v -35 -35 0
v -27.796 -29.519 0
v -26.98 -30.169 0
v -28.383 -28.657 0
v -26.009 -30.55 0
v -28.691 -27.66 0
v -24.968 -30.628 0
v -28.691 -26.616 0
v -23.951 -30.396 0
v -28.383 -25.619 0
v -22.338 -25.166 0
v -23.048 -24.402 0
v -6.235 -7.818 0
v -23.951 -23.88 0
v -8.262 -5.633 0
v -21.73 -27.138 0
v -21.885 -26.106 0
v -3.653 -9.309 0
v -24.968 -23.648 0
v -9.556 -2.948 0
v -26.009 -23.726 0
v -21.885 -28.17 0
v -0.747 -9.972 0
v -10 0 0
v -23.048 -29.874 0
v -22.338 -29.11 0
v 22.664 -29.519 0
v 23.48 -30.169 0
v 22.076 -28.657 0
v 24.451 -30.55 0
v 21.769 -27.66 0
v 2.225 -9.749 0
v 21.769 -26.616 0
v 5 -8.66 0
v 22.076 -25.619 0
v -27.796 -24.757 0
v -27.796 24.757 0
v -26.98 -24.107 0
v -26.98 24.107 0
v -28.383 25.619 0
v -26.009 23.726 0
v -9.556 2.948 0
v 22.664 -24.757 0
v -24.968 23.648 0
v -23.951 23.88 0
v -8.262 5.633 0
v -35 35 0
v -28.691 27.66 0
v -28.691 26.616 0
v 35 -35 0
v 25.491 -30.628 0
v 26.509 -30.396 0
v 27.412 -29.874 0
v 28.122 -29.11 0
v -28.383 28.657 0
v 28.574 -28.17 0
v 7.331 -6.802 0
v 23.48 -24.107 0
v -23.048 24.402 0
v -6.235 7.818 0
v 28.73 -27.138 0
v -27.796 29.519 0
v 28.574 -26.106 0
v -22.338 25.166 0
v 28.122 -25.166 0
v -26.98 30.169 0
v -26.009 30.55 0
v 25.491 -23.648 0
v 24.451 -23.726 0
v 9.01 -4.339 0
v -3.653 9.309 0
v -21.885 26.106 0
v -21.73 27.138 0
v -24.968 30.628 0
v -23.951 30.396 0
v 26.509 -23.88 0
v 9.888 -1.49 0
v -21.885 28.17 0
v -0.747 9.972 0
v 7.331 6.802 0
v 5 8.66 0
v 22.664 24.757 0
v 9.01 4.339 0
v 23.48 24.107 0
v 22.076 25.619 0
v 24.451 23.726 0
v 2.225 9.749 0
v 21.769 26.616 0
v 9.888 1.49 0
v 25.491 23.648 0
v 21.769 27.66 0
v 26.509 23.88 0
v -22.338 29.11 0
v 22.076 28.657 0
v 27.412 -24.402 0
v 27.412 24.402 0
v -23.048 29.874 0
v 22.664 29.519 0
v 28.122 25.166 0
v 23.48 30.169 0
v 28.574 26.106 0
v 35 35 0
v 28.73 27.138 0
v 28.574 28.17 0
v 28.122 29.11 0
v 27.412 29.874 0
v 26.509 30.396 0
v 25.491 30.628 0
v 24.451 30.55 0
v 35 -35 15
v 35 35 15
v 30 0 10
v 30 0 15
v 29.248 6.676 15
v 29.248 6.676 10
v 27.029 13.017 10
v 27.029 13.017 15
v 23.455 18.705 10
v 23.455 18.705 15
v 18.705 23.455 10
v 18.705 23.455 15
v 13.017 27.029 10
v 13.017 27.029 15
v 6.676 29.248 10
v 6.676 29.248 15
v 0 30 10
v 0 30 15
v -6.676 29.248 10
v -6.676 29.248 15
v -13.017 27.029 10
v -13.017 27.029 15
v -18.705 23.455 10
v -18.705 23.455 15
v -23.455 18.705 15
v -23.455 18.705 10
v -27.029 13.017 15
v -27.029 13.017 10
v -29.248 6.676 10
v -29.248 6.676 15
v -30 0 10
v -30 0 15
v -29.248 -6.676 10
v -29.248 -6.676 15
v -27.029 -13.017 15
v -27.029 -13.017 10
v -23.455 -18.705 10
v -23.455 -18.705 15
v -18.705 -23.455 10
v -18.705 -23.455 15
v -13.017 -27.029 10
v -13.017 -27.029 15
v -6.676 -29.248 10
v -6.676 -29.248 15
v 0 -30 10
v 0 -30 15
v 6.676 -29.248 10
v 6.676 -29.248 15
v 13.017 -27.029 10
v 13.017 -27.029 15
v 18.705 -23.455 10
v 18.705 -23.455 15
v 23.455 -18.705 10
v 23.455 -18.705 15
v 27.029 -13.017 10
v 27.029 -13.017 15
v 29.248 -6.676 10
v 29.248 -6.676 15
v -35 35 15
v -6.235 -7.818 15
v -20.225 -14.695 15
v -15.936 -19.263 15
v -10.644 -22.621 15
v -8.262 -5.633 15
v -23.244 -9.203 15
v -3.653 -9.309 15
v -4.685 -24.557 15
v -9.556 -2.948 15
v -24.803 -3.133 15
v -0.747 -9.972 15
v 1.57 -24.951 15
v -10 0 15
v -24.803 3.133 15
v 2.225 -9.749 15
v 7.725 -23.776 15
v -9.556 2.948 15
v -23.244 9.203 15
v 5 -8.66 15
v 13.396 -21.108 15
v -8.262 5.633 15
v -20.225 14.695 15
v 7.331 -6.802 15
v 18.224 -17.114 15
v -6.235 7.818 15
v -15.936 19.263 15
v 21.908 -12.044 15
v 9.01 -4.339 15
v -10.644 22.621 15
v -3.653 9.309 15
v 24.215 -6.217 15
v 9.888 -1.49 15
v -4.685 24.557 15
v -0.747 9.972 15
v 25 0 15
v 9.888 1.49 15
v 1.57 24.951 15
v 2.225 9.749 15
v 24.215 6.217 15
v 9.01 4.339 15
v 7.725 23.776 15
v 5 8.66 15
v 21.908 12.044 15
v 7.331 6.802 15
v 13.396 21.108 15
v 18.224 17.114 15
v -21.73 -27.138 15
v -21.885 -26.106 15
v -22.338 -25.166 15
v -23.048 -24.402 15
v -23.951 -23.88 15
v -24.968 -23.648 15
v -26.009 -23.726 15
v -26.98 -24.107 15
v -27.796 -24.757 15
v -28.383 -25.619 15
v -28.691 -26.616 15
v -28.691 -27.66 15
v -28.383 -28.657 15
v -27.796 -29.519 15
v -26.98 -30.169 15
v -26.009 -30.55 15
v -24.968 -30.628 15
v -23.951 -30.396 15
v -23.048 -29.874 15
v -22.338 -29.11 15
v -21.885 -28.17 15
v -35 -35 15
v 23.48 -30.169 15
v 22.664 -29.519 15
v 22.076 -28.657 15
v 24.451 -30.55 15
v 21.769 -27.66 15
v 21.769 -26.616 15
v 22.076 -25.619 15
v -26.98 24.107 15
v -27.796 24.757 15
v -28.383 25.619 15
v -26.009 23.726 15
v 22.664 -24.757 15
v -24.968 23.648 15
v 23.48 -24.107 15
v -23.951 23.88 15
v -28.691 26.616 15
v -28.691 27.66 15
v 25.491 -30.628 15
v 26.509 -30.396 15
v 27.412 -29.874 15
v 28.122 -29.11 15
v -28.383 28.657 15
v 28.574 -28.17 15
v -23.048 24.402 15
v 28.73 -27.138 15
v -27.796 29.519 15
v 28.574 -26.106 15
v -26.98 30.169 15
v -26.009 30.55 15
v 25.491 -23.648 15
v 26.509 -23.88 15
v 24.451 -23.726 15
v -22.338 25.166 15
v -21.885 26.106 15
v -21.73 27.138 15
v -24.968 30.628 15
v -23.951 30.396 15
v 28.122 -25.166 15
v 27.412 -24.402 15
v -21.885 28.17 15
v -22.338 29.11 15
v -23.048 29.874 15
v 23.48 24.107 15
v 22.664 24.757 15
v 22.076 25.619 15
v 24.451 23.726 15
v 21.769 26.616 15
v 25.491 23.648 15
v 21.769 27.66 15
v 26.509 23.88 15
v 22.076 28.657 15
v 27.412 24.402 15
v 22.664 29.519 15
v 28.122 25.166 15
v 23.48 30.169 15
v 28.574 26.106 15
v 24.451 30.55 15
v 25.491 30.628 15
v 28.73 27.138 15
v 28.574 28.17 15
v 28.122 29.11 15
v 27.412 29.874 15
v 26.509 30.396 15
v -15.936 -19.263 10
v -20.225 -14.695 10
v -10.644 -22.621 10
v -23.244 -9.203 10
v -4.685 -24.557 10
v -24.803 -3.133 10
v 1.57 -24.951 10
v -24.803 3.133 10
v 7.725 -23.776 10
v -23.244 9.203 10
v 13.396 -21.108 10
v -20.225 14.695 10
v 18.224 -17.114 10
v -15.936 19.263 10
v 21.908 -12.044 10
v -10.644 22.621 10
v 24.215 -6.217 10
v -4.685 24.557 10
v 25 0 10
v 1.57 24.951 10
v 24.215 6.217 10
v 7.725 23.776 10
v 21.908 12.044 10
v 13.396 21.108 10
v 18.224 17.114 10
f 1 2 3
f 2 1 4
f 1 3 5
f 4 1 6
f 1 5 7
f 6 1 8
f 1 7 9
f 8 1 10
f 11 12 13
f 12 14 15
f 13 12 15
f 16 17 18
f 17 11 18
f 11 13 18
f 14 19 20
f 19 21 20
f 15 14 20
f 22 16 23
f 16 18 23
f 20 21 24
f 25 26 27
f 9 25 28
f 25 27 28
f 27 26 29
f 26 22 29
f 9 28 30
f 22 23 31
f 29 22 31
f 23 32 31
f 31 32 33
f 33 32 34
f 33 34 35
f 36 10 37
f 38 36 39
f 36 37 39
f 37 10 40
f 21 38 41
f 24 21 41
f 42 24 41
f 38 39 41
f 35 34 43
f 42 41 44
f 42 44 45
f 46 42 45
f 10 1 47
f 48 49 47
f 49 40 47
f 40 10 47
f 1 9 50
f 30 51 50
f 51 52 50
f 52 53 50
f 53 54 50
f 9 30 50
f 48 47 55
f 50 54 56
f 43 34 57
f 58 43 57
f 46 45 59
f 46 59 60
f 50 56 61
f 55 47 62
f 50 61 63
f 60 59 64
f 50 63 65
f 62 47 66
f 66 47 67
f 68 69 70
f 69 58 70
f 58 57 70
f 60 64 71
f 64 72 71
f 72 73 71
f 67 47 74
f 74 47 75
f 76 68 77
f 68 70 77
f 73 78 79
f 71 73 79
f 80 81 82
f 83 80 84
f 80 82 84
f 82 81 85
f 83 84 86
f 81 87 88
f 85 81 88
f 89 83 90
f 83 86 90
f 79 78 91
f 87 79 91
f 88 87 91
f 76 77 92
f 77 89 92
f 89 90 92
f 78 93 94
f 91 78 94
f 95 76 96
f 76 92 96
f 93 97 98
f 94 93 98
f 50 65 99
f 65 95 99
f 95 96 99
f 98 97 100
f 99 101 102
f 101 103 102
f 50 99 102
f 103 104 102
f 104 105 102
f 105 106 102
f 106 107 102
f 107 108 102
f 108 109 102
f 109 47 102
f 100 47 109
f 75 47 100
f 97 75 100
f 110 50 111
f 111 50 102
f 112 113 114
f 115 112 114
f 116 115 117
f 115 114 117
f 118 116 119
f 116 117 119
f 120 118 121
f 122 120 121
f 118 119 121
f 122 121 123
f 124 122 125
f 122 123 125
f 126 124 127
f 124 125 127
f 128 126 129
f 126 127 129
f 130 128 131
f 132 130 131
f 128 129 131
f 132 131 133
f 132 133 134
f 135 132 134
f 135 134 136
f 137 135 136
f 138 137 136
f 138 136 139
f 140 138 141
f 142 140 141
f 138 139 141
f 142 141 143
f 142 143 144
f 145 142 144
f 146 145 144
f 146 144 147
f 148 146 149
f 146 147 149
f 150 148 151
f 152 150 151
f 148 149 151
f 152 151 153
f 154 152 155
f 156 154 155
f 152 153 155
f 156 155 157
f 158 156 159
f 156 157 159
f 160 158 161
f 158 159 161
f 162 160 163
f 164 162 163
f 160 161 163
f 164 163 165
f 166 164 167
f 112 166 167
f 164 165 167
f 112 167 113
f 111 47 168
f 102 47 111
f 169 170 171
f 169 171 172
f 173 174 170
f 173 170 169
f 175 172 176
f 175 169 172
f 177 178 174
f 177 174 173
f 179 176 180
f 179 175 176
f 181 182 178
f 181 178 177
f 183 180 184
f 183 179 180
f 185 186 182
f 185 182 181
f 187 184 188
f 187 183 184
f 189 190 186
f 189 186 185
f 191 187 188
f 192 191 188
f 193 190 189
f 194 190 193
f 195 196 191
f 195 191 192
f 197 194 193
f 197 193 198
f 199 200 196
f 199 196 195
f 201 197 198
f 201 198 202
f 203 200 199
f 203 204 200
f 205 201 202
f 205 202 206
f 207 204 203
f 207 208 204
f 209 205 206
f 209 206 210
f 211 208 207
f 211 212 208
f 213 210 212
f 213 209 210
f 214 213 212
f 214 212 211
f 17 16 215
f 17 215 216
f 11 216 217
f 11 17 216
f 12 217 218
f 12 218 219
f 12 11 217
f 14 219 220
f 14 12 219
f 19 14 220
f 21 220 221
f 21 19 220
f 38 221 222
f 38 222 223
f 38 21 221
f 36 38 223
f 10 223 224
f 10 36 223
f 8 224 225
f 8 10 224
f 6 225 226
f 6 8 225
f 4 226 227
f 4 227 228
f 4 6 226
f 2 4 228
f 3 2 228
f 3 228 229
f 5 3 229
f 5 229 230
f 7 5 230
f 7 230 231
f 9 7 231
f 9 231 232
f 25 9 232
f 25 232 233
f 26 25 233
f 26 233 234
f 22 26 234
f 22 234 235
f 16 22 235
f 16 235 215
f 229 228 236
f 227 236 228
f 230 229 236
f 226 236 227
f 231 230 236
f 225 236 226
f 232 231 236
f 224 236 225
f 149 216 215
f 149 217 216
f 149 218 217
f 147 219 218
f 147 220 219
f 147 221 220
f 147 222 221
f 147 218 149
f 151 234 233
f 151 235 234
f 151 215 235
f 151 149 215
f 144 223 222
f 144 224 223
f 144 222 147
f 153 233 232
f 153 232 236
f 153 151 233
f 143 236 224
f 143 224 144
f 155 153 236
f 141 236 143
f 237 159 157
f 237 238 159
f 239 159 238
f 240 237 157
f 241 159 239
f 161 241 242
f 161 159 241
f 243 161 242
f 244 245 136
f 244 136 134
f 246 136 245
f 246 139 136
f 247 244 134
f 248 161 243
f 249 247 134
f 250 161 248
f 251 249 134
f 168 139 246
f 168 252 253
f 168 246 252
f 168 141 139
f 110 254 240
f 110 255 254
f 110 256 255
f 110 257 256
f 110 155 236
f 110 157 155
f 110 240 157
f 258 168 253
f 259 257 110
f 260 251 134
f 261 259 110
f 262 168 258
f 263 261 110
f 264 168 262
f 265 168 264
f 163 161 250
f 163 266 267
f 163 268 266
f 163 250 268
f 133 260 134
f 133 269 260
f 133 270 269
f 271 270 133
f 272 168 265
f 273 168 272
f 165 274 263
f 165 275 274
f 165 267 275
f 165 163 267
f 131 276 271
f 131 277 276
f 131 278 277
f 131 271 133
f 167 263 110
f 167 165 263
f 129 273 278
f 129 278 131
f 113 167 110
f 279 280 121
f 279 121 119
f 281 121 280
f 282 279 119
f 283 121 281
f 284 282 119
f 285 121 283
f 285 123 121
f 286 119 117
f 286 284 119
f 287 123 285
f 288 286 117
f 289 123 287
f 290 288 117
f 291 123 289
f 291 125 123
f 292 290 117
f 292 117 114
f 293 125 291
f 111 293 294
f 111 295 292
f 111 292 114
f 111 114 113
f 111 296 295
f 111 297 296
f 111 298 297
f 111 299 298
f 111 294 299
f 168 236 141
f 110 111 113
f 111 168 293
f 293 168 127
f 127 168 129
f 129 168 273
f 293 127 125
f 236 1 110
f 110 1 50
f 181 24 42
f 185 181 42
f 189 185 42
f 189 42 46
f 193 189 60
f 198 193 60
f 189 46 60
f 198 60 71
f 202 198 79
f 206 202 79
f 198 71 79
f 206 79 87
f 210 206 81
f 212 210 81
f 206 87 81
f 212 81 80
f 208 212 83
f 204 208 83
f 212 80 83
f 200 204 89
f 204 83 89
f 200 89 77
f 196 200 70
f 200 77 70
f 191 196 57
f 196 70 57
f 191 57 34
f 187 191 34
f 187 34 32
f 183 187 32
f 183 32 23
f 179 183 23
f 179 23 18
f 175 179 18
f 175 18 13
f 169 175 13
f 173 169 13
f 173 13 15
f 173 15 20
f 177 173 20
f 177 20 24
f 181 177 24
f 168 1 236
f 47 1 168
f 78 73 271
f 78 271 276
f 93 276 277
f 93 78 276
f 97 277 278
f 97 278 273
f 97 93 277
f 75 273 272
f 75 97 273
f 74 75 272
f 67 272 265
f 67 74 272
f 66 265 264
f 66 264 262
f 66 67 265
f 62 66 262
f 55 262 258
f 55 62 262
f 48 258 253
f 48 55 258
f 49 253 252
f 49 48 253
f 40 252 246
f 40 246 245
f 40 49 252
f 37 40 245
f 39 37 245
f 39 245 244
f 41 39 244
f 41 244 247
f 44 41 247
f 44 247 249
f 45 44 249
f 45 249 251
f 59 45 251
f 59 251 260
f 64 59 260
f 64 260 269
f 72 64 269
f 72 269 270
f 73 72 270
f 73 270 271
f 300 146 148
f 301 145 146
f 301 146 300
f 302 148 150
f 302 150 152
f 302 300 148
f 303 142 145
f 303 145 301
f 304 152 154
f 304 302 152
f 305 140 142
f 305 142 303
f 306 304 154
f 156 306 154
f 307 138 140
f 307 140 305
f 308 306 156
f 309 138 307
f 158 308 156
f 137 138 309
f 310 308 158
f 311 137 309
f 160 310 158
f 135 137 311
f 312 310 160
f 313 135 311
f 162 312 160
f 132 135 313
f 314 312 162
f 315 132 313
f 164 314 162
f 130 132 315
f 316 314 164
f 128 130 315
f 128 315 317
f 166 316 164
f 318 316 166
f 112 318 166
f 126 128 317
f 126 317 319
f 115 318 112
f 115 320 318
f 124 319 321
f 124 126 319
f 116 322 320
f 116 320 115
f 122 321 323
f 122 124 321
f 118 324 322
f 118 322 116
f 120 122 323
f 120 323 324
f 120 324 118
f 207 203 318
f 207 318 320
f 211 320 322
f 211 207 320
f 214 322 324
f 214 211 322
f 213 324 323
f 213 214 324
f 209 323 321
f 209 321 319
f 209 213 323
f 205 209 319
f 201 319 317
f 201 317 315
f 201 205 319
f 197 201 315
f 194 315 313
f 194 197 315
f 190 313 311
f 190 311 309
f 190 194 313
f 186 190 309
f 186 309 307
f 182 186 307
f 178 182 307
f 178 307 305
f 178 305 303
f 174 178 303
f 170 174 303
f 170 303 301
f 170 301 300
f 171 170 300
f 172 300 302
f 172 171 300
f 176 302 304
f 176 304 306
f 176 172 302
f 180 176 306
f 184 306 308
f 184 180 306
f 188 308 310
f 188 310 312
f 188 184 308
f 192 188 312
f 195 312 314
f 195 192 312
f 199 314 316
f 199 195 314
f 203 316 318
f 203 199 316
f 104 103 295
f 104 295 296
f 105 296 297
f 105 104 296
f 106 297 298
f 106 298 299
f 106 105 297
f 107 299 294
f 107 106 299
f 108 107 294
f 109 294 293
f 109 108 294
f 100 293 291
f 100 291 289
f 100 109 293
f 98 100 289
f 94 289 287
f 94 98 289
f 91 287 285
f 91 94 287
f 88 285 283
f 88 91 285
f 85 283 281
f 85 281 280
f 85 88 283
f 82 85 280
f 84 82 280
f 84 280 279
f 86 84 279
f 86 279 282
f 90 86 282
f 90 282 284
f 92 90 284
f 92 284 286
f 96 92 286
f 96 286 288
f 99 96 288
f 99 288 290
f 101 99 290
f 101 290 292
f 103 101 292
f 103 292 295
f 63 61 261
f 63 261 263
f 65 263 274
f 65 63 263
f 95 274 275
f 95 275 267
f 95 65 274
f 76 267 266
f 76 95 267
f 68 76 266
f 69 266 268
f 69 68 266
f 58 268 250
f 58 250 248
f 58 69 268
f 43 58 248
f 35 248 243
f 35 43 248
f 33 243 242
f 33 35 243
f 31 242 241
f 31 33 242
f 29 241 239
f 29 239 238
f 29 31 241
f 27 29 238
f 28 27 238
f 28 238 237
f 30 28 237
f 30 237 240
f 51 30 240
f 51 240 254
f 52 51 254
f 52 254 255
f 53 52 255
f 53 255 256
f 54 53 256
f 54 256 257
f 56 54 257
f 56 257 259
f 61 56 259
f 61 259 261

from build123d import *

# Parameters (mm, degrees)
SKETCH1_W           = 70
SKETCH1_H           = 70
BOSS_EXTRUDE1_DEPTH = 15
SKETCH2_R           = 30
SKETCH2_R_2         = 25
SKETCH2_R_3         = 3.5
CUT_EXTRUDE1_DEPTH  = 5
SKETCH3_R           = 3.5
CUT_EXTRUDE2_DEPTH  = 16
SKETCH4_R           = 10
CUT_EXTRUDE3_DEPTH  = 16


with BuildPart() as part:
    # Sketch1 → Boss-Extrude1 (new body)
    with BuildSketch(Plane.XY):
        Rectangle(SKETCH1_W, SKETCH1_H)
    extrude(amount=BOSS_EXTRUDE1_DEPTH)

    # Sketch2 → Cut-Extrude1 (cut)
    with BuildSketch(Plane.XY.offset(15)):
        Circle(SKETCH2_R)
        Circle(SKETCH2_R_2, mode=Mode.SUBTRACT)
        with Locations((-25.229863316, 27.137958195)):
            Circle(SKETCH2_R_3)
        with Locations((25.229863316, 27.137958195)):
            Circle(SKETCH2_R_3)
        with Locations((25.229863316, -27.137958195)):
            Circle(SKETCH2_R_3)
        with Locations((-25.229863316, -27.137958195)):
            Circle(SKETCH2_R_3)
    extrude(amount=-CUT_EXTRUDE1_DEPTH, mode=Mode.SUBTRACT)

    # Sketch3 → Cut-Extrude2 (cut, through all)
    with BuildSketch(Plane.XY):
        with Locations((-25.229863316, 27.137958195)):
            Circle(SKETCH3_R)
        with Locations((25.229863316, 27.137958195)):
            Circle(SKETCH3_R)
        with Locations((25.229863316, -27.137958195)):
            Circle(SKETCH3_R)
        with Locations((-25.229863316, -27.137958195)):
            Circle(SKETCH3_R)
    extrude(amount=CUT_EXTRUDE2_DEPTH, mode=Mode.SUBTRACT)

    # Sketch4 → Cut-Extrude3 (cut, through all)
    with BuildSketch(Plane(origin=(0, 0, 0), x_dir=(-1, 0, 0), z_dir=(0, 0, -1))):
        Circle(SKETCH4_R)
    extrude(amount=-CUT_EXTRUDE3_DEPTH, mode=Mode.SUBTRACT)


solid = part.part
